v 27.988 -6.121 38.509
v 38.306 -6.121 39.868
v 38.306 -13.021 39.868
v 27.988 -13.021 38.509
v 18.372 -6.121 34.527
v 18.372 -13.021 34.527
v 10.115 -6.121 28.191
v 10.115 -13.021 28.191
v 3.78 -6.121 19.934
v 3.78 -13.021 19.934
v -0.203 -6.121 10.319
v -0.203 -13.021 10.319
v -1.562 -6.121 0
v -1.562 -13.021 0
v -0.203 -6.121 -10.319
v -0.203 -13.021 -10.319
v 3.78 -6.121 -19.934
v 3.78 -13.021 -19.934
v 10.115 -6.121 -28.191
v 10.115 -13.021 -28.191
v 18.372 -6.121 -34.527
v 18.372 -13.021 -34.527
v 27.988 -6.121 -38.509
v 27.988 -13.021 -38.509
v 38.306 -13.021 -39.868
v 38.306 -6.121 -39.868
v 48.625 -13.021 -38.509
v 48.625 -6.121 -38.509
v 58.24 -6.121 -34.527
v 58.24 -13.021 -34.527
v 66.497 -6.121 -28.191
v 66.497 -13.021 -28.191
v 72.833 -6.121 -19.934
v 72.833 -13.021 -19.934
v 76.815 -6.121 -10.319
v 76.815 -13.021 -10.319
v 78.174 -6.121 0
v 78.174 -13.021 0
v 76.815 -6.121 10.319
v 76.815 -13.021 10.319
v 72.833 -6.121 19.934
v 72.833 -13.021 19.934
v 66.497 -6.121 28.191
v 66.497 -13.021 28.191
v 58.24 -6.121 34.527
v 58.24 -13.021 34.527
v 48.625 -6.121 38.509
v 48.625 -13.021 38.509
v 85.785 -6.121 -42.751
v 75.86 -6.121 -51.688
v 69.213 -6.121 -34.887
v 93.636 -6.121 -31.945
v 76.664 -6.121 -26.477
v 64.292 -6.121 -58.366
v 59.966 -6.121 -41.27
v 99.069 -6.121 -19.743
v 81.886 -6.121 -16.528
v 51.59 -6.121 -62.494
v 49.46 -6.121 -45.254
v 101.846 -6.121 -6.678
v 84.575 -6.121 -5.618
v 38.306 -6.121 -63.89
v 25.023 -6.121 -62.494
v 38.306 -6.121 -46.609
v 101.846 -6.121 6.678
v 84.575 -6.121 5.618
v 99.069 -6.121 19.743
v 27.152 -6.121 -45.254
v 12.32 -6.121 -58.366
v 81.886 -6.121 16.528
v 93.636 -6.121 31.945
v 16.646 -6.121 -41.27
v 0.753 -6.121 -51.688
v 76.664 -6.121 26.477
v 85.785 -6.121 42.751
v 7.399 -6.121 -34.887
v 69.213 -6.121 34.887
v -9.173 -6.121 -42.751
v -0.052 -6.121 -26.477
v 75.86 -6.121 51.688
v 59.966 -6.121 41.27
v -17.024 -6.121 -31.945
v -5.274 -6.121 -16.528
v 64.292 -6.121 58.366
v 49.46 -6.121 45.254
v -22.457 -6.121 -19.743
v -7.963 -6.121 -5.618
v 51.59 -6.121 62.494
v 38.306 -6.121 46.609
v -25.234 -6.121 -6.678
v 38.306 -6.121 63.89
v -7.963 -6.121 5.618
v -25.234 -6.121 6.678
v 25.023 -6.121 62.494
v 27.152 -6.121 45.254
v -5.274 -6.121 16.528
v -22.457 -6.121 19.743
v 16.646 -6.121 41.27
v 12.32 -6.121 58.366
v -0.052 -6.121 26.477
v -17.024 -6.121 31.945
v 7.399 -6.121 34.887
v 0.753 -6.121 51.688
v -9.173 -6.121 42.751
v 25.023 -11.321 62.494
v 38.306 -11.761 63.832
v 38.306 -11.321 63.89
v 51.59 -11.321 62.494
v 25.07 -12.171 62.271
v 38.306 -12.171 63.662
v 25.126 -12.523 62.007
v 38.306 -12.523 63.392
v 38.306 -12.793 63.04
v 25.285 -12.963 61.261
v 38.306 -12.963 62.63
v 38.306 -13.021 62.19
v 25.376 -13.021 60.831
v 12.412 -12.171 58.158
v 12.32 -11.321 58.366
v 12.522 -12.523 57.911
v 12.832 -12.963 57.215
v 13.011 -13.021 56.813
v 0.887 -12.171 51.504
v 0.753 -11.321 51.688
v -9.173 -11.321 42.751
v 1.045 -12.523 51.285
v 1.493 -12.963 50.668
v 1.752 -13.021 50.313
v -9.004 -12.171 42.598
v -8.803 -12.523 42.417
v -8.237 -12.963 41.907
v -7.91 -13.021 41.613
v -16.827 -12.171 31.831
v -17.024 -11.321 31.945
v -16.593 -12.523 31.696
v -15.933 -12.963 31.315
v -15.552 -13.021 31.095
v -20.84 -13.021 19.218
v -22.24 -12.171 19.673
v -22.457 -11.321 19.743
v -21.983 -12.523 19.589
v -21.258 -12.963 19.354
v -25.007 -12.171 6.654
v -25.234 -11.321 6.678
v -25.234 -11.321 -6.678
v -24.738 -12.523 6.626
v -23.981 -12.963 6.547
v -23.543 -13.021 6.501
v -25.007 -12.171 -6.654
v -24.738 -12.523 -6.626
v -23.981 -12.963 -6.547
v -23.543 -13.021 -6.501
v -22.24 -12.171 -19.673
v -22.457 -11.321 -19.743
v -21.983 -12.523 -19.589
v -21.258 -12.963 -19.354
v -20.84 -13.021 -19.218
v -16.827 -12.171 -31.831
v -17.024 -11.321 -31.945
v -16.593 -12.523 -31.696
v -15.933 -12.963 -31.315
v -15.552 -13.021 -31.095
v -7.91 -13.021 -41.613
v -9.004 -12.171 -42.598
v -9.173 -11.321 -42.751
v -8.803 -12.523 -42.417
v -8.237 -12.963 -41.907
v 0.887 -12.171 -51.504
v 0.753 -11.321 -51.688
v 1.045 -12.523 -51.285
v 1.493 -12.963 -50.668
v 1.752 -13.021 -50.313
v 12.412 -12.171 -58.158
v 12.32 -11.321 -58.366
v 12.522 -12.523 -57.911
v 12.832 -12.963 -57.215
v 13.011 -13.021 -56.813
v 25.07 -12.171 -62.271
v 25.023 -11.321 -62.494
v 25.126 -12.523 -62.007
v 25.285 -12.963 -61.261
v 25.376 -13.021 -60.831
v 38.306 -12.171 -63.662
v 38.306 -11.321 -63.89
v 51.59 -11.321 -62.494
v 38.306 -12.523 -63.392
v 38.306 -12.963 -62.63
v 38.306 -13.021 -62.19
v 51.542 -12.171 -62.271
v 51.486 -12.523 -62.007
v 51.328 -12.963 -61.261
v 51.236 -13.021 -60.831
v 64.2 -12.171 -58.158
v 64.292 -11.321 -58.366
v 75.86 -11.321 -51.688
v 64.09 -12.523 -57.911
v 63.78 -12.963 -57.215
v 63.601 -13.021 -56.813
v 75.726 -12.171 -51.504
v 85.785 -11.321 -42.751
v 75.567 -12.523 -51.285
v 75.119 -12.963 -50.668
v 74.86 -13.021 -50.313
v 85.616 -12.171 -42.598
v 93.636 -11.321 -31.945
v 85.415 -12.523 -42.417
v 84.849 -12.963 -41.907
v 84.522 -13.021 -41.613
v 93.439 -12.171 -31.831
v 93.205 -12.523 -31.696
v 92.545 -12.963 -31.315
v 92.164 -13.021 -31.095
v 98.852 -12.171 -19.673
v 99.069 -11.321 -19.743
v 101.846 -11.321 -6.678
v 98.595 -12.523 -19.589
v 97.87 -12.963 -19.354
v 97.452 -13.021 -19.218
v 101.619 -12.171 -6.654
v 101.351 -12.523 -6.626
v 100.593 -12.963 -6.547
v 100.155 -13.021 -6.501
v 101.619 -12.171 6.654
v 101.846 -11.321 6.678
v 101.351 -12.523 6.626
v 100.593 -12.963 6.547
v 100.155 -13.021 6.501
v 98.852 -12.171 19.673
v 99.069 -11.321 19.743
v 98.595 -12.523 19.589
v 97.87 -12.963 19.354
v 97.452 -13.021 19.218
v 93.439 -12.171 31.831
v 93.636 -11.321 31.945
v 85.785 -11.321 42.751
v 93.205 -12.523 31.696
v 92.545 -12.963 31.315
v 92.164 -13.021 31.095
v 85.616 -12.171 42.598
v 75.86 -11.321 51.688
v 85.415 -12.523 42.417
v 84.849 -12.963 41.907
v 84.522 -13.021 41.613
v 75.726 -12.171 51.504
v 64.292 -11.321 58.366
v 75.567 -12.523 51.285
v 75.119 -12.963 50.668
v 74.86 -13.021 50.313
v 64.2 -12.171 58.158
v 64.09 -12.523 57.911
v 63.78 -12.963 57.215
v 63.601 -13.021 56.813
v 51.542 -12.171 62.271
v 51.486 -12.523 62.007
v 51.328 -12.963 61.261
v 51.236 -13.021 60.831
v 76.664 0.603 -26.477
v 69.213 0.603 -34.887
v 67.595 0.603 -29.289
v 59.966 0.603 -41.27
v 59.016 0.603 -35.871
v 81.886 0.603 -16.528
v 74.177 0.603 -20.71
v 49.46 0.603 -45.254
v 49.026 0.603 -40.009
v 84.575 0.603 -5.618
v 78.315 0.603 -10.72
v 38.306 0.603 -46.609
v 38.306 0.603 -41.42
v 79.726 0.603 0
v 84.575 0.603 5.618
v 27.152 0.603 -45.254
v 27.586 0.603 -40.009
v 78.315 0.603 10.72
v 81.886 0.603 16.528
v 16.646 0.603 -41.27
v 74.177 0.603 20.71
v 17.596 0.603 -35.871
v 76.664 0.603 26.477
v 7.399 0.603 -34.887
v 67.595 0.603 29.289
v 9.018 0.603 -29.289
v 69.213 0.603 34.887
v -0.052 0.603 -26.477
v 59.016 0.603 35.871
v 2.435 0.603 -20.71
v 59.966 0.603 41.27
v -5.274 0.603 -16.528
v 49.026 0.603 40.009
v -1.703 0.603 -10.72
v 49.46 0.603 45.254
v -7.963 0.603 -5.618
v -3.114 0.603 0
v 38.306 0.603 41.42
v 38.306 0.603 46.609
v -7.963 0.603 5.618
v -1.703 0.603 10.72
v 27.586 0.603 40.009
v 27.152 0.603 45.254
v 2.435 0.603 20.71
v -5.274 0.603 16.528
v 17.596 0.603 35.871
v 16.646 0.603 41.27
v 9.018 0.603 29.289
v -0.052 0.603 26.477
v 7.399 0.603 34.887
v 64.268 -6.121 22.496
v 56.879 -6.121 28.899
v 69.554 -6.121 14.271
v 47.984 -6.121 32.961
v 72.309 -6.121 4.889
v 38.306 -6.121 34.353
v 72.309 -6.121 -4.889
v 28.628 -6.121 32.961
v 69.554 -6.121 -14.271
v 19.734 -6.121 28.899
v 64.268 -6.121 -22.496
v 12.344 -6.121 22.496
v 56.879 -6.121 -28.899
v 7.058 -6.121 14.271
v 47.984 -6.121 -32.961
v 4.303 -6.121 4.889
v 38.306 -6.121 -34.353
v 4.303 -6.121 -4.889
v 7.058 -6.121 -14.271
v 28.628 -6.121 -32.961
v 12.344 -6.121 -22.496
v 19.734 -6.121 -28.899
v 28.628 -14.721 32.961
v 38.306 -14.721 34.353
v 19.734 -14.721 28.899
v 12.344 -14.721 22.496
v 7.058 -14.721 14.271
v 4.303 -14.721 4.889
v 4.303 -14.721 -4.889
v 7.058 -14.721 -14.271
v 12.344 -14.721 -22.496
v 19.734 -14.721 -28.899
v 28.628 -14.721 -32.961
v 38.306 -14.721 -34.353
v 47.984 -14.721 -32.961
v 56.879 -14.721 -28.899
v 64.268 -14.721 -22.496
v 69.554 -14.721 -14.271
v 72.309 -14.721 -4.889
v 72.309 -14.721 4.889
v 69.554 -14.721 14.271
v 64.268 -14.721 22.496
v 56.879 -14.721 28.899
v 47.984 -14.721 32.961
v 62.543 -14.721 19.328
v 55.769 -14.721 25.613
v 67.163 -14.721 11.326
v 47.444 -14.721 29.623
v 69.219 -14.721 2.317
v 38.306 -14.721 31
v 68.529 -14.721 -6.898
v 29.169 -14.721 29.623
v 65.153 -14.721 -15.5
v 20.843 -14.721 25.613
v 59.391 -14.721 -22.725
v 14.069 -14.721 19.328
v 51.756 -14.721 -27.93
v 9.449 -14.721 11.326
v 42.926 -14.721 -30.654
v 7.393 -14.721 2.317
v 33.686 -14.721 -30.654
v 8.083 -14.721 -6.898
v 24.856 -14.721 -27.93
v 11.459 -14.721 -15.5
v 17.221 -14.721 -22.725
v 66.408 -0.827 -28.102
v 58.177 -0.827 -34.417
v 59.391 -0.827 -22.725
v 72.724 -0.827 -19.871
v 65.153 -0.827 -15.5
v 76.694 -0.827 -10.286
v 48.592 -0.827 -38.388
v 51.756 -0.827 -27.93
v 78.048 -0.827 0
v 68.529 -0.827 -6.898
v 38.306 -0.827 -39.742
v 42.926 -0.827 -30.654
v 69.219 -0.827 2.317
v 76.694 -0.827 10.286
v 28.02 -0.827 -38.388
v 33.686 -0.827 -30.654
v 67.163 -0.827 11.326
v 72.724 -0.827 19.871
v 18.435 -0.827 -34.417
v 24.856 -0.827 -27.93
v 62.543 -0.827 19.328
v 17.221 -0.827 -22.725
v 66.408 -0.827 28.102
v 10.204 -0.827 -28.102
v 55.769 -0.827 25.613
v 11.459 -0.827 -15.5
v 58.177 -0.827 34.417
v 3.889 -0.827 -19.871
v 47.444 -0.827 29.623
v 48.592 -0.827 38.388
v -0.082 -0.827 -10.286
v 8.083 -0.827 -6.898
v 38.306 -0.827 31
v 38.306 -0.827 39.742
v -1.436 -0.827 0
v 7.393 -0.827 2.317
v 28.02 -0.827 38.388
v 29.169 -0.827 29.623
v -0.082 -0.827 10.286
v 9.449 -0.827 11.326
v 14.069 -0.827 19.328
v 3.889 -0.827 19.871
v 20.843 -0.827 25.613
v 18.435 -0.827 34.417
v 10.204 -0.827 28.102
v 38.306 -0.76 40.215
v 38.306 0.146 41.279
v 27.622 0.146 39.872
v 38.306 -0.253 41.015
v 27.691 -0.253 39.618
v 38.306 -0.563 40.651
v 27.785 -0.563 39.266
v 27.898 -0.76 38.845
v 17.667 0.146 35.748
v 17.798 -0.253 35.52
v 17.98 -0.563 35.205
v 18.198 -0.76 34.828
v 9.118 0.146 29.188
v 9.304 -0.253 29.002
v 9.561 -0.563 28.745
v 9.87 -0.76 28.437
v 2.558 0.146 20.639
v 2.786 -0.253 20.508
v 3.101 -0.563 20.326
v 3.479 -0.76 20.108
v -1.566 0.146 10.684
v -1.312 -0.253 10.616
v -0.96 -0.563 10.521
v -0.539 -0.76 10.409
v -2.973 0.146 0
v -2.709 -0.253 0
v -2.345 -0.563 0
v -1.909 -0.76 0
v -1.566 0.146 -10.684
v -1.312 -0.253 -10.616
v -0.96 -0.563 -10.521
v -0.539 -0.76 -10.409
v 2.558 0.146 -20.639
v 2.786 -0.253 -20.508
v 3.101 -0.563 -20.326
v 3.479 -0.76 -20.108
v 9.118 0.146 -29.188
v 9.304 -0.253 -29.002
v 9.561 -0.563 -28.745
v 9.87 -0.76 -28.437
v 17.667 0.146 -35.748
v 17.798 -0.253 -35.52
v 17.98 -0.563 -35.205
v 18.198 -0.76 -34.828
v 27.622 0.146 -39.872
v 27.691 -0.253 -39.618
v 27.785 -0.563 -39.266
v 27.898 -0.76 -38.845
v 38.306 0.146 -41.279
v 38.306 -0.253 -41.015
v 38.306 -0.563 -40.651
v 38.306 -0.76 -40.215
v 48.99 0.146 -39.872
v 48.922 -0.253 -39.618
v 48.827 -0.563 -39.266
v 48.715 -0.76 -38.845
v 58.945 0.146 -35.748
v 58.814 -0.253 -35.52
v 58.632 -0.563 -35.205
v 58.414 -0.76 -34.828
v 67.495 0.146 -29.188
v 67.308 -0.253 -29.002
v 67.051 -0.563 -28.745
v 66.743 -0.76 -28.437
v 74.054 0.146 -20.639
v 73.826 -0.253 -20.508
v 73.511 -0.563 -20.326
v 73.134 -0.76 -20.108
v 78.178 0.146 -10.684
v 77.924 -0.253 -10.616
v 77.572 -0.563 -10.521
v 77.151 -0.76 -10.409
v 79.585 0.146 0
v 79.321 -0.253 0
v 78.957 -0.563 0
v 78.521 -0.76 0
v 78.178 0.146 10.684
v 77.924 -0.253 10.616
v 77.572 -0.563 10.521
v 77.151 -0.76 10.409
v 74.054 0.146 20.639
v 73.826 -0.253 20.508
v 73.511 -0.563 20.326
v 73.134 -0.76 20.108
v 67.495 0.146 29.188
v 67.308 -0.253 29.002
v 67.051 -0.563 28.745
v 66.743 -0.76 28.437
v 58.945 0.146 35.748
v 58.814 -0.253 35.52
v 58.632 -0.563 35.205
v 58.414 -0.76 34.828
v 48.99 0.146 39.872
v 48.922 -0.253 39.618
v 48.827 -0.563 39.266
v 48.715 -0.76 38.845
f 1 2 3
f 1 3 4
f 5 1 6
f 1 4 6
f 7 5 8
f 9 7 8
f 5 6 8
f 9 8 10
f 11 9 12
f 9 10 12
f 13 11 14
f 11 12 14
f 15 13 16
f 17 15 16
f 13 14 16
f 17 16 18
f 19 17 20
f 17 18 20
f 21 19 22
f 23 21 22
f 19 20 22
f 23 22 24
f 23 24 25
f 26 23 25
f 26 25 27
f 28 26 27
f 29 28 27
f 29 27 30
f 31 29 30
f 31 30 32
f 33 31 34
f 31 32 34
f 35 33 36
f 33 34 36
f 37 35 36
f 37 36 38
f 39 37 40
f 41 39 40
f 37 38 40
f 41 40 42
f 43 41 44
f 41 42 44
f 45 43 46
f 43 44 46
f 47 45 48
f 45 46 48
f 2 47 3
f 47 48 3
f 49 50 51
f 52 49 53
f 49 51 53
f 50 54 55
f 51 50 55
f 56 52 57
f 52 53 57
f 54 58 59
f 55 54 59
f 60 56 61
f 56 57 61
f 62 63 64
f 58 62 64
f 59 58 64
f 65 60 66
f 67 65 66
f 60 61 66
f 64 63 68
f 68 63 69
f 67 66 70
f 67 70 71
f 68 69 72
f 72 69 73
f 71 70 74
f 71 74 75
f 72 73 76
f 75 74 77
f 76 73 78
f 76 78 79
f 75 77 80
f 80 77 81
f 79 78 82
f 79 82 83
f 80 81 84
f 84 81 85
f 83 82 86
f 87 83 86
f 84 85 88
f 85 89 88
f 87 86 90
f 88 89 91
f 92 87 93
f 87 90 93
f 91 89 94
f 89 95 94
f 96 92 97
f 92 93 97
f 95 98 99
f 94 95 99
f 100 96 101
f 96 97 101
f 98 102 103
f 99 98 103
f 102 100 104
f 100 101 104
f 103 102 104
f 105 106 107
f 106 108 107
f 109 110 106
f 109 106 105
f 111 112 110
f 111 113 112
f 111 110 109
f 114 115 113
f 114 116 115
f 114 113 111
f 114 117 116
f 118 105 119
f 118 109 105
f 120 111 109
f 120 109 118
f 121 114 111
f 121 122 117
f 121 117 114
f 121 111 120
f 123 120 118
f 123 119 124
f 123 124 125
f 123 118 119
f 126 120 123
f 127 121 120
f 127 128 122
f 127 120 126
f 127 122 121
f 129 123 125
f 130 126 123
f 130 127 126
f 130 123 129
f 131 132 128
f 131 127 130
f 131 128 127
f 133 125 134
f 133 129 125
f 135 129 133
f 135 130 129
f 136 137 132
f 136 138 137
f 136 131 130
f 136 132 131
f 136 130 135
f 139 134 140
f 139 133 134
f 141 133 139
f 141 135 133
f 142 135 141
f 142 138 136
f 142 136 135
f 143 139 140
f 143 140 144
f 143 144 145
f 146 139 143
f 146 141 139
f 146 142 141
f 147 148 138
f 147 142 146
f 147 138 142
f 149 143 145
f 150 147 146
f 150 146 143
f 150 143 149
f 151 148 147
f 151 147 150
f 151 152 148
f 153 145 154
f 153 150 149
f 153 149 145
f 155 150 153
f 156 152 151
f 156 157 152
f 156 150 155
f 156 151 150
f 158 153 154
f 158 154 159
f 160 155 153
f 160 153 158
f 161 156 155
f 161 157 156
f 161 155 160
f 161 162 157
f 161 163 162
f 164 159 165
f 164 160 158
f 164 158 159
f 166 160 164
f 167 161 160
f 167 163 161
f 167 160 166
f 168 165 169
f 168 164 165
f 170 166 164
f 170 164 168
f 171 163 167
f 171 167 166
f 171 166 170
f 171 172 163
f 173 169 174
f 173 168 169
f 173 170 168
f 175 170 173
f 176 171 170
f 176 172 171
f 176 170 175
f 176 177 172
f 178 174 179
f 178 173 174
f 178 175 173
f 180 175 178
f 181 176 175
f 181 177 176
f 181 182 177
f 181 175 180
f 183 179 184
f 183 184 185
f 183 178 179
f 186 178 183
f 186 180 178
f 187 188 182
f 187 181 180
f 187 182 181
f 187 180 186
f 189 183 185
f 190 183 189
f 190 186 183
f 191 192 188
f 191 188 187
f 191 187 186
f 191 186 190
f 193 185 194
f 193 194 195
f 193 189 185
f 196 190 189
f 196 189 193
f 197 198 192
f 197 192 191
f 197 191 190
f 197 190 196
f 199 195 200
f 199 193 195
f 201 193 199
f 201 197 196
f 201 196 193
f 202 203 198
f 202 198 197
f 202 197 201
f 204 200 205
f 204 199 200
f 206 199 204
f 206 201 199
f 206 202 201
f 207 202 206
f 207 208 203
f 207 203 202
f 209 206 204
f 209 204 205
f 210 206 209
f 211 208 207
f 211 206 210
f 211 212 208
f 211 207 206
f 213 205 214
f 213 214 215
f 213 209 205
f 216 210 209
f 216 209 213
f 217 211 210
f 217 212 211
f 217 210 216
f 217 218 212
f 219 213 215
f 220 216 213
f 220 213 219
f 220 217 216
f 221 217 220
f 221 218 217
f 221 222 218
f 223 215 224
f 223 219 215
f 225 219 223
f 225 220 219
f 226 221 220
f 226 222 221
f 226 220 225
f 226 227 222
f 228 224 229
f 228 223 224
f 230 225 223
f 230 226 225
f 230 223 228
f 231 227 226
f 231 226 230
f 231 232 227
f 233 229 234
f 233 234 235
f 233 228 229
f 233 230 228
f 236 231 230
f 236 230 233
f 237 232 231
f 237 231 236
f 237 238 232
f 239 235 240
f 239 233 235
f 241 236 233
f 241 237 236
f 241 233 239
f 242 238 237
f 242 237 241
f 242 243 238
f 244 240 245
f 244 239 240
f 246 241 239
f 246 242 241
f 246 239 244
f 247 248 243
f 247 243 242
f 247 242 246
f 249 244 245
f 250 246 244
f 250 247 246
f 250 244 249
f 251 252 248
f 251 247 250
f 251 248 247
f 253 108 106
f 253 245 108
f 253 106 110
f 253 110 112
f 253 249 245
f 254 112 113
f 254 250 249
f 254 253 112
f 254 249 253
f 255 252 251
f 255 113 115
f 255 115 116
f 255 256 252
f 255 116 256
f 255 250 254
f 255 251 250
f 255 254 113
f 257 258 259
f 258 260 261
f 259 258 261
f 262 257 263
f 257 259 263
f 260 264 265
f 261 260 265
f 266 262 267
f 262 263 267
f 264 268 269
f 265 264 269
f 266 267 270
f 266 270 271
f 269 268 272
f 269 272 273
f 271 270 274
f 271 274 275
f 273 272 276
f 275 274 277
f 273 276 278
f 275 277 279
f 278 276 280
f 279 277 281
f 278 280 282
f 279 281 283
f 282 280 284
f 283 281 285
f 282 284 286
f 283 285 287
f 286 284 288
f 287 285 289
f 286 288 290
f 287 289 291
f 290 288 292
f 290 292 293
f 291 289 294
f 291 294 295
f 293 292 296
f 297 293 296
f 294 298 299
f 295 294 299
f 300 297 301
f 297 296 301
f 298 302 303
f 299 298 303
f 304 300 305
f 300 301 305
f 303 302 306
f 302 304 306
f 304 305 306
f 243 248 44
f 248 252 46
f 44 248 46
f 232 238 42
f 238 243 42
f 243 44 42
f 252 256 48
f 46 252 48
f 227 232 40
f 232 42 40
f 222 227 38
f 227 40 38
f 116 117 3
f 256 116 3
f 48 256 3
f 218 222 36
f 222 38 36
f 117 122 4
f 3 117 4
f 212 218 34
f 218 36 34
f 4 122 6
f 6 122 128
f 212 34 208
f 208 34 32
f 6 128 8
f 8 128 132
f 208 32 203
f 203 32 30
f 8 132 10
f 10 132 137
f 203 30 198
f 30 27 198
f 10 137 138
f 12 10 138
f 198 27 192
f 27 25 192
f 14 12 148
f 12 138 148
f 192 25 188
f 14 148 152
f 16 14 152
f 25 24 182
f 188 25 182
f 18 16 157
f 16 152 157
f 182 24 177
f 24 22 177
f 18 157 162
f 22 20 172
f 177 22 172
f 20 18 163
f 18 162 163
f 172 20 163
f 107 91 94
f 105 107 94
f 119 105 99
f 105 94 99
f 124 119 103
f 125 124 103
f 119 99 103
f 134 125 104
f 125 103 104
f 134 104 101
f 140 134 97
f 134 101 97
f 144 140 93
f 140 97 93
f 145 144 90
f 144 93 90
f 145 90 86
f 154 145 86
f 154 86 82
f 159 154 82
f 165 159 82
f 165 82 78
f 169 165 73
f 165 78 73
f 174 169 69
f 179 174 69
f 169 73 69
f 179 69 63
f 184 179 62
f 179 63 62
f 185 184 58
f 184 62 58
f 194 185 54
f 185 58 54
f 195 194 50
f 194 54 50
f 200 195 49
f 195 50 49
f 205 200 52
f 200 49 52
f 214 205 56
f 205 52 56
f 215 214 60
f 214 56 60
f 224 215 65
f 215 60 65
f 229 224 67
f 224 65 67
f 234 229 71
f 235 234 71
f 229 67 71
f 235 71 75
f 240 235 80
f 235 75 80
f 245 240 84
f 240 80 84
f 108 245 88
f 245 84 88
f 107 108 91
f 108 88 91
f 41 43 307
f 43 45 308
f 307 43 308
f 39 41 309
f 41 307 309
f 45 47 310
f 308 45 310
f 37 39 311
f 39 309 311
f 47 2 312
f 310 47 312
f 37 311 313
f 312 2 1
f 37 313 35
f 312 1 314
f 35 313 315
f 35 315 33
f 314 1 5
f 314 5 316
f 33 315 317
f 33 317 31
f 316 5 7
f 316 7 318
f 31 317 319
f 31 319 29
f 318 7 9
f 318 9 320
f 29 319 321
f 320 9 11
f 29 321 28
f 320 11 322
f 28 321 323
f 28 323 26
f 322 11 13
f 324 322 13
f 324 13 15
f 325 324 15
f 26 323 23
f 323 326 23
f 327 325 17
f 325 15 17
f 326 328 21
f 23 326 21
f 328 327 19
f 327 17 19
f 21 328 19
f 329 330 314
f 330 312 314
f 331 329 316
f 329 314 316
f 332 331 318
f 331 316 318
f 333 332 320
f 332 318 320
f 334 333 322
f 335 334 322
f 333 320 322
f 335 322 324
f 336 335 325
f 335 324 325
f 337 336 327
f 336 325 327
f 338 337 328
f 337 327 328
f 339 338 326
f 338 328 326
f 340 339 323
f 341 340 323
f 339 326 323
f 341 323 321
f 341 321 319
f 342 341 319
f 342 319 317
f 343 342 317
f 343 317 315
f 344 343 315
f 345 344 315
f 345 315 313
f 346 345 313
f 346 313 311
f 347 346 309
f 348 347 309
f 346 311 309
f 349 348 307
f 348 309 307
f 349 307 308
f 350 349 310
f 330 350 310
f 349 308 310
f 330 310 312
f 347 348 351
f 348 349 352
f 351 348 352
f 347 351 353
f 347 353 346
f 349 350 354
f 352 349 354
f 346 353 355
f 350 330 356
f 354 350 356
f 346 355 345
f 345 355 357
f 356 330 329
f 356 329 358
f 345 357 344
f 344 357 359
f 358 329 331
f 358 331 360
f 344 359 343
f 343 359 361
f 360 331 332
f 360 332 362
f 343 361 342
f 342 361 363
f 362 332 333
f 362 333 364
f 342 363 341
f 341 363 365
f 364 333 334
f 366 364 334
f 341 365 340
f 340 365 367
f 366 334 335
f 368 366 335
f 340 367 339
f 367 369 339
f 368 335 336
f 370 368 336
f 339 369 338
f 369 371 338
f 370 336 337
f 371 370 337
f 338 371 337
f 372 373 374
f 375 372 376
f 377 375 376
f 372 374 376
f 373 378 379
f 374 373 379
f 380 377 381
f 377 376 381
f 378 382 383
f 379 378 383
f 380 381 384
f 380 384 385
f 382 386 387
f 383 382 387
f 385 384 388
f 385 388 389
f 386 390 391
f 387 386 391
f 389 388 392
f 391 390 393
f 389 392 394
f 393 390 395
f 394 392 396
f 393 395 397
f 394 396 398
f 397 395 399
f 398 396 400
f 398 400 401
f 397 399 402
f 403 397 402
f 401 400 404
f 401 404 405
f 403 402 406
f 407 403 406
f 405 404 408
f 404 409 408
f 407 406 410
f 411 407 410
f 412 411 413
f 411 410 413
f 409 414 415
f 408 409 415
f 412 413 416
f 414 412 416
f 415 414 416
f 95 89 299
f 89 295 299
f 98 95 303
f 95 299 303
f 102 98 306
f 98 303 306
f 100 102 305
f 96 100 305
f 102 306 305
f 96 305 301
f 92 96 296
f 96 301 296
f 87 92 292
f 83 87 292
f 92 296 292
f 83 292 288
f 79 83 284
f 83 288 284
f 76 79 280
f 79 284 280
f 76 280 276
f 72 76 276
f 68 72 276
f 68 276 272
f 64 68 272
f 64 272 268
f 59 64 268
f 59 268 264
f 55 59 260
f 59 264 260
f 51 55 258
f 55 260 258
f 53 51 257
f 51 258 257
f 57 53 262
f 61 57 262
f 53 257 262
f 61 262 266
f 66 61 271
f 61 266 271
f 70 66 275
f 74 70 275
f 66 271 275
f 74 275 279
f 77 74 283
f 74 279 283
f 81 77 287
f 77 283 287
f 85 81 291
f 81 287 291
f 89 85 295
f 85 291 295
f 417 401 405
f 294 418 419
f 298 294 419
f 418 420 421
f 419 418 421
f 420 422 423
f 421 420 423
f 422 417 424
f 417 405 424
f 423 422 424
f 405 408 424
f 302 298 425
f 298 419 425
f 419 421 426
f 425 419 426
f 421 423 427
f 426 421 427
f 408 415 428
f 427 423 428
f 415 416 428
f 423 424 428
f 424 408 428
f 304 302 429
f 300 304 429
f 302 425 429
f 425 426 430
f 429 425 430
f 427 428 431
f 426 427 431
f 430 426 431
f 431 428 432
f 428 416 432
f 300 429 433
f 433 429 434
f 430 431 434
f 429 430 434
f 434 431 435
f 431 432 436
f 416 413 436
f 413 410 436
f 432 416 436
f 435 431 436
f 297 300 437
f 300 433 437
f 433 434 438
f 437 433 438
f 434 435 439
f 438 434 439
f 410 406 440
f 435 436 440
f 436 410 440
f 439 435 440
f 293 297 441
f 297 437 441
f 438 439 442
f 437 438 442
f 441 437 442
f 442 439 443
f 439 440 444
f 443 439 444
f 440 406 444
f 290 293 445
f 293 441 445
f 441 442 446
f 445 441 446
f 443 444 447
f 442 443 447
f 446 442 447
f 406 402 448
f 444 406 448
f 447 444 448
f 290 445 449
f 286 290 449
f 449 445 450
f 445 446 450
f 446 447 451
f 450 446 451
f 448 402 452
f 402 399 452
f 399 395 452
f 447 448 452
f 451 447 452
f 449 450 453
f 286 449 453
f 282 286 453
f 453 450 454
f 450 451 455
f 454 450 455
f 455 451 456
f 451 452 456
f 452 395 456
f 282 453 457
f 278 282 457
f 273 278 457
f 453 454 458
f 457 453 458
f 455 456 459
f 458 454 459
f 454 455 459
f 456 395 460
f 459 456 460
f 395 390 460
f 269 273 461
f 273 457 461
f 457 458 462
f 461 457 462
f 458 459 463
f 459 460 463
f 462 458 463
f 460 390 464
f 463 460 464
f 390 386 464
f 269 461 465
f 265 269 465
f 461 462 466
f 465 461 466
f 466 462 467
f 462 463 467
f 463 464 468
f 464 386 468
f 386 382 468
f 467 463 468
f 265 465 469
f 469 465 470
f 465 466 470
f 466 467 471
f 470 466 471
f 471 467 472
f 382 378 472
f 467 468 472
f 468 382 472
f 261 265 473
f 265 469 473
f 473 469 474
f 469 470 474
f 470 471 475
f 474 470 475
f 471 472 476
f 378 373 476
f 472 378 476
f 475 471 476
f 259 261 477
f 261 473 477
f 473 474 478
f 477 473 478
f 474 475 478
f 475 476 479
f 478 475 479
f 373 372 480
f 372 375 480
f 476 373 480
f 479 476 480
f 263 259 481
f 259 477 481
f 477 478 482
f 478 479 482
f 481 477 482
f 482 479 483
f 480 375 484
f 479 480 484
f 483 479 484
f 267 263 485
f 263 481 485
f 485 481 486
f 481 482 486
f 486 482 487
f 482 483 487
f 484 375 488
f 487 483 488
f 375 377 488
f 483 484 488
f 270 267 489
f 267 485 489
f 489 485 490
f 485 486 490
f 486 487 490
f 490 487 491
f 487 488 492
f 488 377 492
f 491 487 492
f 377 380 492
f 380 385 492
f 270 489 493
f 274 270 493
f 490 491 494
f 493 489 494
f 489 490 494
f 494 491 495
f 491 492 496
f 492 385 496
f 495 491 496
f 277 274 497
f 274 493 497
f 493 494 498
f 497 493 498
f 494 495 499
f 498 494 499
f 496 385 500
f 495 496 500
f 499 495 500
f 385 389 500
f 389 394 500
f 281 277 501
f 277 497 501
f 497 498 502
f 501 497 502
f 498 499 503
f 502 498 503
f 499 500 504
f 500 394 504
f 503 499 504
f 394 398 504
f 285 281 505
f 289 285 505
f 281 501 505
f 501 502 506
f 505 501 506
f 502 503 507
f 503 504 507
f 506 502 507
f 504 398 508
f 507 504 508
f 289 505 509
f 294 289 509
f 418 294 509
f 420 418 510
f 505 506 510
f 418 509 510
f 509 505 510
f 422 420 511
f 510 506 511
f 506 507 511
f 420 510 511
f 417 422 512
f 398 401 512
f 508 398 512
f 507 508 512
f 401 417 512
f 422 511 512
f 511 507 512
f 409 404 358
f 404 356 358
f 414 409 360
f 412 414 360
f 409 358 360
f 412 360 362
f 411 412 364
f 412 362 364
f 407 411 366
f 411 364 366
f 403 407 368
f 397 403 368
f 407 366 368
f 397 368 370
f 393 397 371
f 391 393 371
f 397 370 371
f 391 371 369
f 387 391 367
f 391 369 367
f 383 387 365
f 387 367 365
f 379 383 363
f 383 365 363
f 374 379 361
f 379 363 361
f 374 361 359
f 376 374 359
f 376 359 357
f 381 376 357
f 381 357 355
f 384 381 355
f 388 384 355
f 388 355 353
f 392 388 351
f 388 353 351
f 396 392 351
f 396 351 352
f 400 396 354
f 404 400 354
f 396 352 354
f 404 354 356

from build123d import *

# Parameters (mm, degrees)
FILLET3_R = 1.7
FILLET4_R = 1.7


with BuildPart() as part:
    # Sketch1 → Revolve2 (revolve)
    with BuildSketch(Plane.XY, mode=Mode.PRIVATE) as revolve2_sk:
        Polygon((-3.114208506, -0.827200396), (7.306092253, -0.827200396), (7.306092253, -14.720657828), (3.953440281, -14.720657828), (3.953440281, -6.120657828), (-1.56177698, -6.120657828), (-1.56177698, -13.020657828), (-25.583612163, -13.020657828), (-25.583612163, -6.120657828), (-8.302598077, -6.120657828), (-8.302598077, 0.602670746), (-3.114208506, 0.602670746), align=None)
    revolve(revolve2_sk.sketch.rotate(Axis((38.306092253, 0.602670746, 0), (0, -1, 0)), 270), axis=Axis((38.306092253, 0.602670746, 0), (0, -1, 0)))

    # Fillet3
    # the kernel refuses this fillet: 1.7 mm, written as the material it adds along each edge
    with BuildSketch(Plane(origin=(38.306092253, -0.827200396, 0), x_dir=(0, 0, 1), z_dir=(1, 0, 0))) as fillet3_piece_1:
        with BuildLine():
            CenterArc((39.741899614, -1.7), FILLET3_R, 9.143015085, 80.856984915)
            Line((41.420300758, -1.429871142), (41.453868781, -1.424468565))
            ThreePointArc((41.453868781, -1.424468565), (41.454300758, -0.714935571), (41.454300758, 0))
            Line((41.454300758, 0), (41.420300758, 0.034))
            Line((41.420300758, 0.034), (39.741899614, 0.034))
            Line((39.741899614, 0.034), (39.741899614, 0))
        make_face()
    revolve(axis=Axis((38.306092253, -0.827200396, 0), (0, -1, 0)))

    # Fillet4
    fillet4_edges = [part.edges().sort_by_distance(p)[0] for p in [
        (38.306092253, -13.020657828, -63.889704416),
    ]]
    fillet(fillet4_edges, radius=FILLET4_R)


solid = part.part
